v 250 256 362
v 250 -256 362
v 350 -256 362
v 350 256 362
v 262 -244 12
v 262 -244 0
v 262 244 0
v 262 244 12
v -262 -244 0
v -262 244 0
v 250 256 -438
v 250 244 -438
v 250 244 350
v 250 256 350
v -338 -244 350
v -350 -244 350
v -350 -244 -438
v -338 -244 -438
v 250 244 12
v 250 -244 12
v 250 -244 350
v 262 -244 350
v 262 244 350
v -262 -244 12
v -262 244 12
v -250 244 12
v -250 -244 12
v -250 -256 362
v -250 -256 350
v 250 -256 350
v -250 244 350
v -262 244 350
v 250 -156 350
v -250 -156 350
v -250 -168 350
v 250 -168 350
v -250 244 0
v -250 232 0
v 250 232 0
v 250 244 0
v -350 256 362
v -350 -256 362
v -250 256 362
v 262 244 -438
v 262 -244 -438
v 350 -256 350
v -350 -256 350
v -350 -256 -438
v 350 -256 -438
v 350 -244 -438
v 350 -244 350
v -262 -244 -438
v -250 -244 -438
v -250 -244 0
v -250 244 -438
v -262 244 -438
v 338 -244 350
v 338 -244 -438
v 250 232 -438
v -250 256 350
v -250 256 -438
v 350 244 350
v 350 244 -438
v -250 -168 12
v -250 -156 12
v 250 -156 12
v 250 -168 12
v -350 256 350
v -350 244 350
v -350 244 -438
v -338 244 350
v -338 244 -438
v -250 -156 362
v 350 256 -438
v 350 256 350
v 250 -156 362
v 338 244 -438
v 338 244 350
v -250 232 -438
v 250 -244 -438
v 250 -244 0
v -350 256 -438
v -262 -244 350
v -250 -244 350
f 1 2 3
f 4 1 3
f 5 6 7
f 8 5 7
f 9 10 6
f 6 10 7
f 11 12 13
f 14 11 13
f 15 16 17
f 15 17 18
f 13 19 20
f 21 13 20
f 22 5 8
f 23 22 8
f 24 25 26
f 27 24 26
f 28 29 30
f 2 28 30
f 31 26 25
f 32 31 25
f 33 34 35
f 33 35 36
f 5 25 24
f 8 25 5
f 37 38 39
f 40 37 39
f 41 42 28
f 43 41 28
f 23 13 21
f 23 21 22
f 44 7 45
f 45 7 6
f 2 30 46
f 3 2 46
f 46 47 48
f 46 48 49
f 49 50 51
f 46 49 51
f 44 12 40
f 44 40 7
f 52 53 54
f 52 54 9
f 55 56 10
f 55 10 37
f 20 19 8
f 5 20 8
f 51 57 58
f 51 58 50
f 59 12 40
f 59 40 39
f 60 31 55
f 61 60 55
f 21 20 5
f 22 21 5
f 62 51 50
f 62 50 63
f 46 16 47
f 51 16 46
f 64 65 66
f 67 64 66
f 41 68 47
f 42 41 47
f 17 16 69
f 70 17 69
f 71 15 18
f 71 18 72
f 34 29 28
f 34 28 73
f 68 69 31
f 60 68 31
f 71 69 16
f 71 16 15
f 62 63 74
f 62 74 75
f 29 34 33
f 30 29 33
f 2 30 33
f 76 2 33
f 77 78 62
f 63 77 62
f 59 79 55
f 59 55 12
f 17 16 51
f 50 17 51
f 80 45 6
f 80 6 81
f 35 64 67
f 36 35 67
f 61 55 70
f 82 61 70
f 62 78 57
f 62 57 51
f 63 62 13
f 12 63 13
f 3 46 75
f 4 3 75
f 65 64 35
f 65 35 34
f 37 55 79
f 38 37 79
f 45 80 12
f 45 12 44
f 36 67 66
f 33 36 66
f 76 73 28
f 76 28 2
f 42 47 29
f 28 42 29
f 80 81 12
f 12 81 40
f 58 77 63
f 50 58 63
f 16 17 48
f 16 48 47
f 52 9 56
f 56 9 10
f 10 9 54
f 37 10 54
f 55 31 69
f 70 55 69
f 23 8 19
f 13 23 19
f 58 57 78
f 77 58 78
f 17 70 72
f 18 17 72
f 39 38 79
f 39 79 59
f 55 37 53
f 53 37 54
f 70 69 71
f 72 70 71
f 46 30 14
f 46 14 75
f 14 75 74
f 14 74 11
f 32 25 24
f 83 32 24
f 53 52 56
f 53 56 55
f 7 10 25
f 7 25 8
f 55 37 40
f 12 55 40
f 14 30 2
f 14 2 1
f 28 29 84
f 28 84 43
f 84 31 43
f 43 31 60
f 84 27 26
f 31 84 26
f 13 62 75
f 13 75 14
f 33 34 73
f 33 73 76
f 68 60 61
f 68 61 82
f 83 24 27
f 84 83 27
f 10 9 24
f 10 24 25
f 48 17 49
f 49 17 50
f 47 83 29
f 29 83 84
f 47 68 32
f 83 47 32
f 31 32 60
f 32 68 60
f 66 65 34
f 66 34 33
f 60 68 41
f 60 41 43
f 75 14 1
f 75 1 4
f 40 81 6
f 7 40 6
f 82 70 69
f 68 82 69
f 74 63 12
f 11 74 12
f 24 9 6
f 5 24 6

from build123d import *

# Parameters (mm, degrees)
F0_W      = 524
F0_H      = 488
F1_DEPTH  = 12
F2_W      = 500
F2_H      = 12
F3_DEPTH  = 438
F4_DEPTH  = 438
F5_DEPTH  = 438
F7_DEPTH  = 338
F8_DEPTH  = 338
F6_W      = 500
F6_H      = 12
F9_DEPTH  = 338
F10_W     = 100
F10_H     = 788
F11_DEPTH = 12
F10_W_2   = 12
F10_H_2   = 338
F12_DEPTH = 12
F13_W     = 100
F13_H     = 512
F14_DEPTH = 12
F13_H_2   = 500
F13_H_3   = 12
F15_DEPTH = 12
F16_W     = 12
F16_H     = 488
F17_DEPTH = 788
F18_W     = 700
F18_H     = 788
F19_DEPTH = 12
F20_W     = 500
F20_H     = 100
F21_DEPTH = 12


with BuildPart() as f1:
    # F0 (on Top) → F1 (new body)
    with BuildSketch(Plane.XY):
        Rectangle(F0_W, F0_H)
    extrude(amount=F1_DEPTH)


with BuildPart() as f3:
    # F2 (on face) → F3 (new body)
    with BuildSketch(Plane(origin=(0, 0, 0), x_dir=(1, 0, 0), z_dir=(0, 0, -1))):
        with Locations((0, -238)):
            Rectangle(F2_W, F2_H)
    extrude(amount=F3_DEPTH)


with BuildPart() as f4:
    # F2 (on face) → F4 (new body)
    with BuildSketch(Plane(origin=(0, 0, 0), x_dir=(1, 0, 0), z_dir=(0, 0, -1))):
        Polygon((-250, 244), (-262, 244), (-262, -244), (-250, -244), (-250, -232), align=None)
    extrude(amount=F4_DEPTH)


with BuildPart() as f5:
    # F2 (on face) → F5 (new body)
    with BuildSketch(Plane(origin=(0, 0, 0), x_dir=(1, 0, 0), z_dir=(0, 0, -1))):
        Polygon((262, 244), (250, 244), (250, -232), (250, -244), (262, -244), align=None)
    extrude(amount=F5_DEPTH)


with BuildPart() as f7:
    # F6 (on face) → F7 (new body)
    with BuildSketch(Plane.XY.offset(12)):
        Polygon((262, -244), (262, 244), (250, 244), (250, -156), (250, -168), (250, -244), align=None)
    extrude(amount=F7_DEPTH)


with BuildPart() as f8:
    # F6 (on face) → F8 (new body)
    with BuildSketch(Plane.XY.offset(12)):
        Polygon((-250, -156), (-250, 244), (-262, 244), (-262, -244), (-250, -244), (-250, -168), align=None)
    extrude(amount=F8_DEPTH)

    # F13 (on face) → F15 (join)
    with BuildSketch(Plane.XY.offset(350)):
        with Locations((-300, -6)):
            Rectangle(F13_W, F13_H_2)
        with Locations((-300, 250)):
            Rectangle(F13_W, F13_H_3)
    extrude(amount=F15_DEPTH)


with BuildPart() as f9:
    # F6 (on face) → F9 (new body)
    with BuildSketch(Plane.XY.offset(12)):
        with Locations((0, -162)):
            Rectangle(F6_W, F6_H)
    extrude(amount=F9_DEPTH)


with BuildPart() as f11:
    # F10 (on face) → F11 (new body)
    with BuildSketch(Plane(origin=(0, 244, 0), x_dir=(-1, 0, 0), z_dir=(0, 1, 0))):
        with Locations((-300, -44)):
            Rectangle(F10_W, F10_H)
    extrude(amount=F11_DEPTH)


with BuildPart() as f12:
    # F10 (on face) → F12 (new body)
    with BuildSketch(Plane(origin=(0, 244, 0), x_dir=(-1, 0, 0), z_dir=(0, 1, 0))):
        with Locations((256, 181)):
            Rectangle(F10_W_2, F10_H_2)
        Polygon((350, 350), (262, 350), (262, 12), (250, 12), (250, -438), (350, -438), align=None)
    extrude(amount=F12_DEPTH)


with BuildPart() as f14:
    # F13 (on face) → F14 (new body)
    with BuildSketch(Plane.XY.offset(350)):
        with Locations((300, 0)):
            Rectangle(F13_W, F13_H)
    extrude(amount=F14_DEPTH)


with BuildPart() as f17:
    # F16 (on face) → F17 (new body)
    with BuildSketch(Plane.XY.offset(350)):
        with Locations((-344, 0)):
            Rectangle(F16_W, F16_H)
    extrude(amount=-F17_DEPTH)


with BuildPart() as f17b:
    # F16 (on face) → F17, piece 2 (new body)
    with BuildSketch(Plane.XY.offset(350)):
        with Locations((344, 0)):
            Rectangle(F16_W, F16_H)
    extrude(amount=-F17_DEPTH)


with BuildPart() as f19:
    # F18 (on face) → F19 (new body)
    with BuildSketch(Plane.XZ.offset(244)):
        with Locations((0, -44)):
            Rectangle(F18_W, F18_H)
    extrude(amount=F19_DEPTH)


with BuildPart() as f21:
    # F20 (on face) → F21 (new body)
    with BuildSketch(Plane.XY.offset(350)):
        with Locations((0, -206)):
            Rectangle(F20_W, F20_H)
    extrude(amount=F21_DEPTH)


solid = Compound([f1.part, f3.part, f4.part, f5.part, f7.part, f8.part, f9.part, f11.part, f12.part, f14.part, f17.part, f17b.part, f19.part, f21.part])
